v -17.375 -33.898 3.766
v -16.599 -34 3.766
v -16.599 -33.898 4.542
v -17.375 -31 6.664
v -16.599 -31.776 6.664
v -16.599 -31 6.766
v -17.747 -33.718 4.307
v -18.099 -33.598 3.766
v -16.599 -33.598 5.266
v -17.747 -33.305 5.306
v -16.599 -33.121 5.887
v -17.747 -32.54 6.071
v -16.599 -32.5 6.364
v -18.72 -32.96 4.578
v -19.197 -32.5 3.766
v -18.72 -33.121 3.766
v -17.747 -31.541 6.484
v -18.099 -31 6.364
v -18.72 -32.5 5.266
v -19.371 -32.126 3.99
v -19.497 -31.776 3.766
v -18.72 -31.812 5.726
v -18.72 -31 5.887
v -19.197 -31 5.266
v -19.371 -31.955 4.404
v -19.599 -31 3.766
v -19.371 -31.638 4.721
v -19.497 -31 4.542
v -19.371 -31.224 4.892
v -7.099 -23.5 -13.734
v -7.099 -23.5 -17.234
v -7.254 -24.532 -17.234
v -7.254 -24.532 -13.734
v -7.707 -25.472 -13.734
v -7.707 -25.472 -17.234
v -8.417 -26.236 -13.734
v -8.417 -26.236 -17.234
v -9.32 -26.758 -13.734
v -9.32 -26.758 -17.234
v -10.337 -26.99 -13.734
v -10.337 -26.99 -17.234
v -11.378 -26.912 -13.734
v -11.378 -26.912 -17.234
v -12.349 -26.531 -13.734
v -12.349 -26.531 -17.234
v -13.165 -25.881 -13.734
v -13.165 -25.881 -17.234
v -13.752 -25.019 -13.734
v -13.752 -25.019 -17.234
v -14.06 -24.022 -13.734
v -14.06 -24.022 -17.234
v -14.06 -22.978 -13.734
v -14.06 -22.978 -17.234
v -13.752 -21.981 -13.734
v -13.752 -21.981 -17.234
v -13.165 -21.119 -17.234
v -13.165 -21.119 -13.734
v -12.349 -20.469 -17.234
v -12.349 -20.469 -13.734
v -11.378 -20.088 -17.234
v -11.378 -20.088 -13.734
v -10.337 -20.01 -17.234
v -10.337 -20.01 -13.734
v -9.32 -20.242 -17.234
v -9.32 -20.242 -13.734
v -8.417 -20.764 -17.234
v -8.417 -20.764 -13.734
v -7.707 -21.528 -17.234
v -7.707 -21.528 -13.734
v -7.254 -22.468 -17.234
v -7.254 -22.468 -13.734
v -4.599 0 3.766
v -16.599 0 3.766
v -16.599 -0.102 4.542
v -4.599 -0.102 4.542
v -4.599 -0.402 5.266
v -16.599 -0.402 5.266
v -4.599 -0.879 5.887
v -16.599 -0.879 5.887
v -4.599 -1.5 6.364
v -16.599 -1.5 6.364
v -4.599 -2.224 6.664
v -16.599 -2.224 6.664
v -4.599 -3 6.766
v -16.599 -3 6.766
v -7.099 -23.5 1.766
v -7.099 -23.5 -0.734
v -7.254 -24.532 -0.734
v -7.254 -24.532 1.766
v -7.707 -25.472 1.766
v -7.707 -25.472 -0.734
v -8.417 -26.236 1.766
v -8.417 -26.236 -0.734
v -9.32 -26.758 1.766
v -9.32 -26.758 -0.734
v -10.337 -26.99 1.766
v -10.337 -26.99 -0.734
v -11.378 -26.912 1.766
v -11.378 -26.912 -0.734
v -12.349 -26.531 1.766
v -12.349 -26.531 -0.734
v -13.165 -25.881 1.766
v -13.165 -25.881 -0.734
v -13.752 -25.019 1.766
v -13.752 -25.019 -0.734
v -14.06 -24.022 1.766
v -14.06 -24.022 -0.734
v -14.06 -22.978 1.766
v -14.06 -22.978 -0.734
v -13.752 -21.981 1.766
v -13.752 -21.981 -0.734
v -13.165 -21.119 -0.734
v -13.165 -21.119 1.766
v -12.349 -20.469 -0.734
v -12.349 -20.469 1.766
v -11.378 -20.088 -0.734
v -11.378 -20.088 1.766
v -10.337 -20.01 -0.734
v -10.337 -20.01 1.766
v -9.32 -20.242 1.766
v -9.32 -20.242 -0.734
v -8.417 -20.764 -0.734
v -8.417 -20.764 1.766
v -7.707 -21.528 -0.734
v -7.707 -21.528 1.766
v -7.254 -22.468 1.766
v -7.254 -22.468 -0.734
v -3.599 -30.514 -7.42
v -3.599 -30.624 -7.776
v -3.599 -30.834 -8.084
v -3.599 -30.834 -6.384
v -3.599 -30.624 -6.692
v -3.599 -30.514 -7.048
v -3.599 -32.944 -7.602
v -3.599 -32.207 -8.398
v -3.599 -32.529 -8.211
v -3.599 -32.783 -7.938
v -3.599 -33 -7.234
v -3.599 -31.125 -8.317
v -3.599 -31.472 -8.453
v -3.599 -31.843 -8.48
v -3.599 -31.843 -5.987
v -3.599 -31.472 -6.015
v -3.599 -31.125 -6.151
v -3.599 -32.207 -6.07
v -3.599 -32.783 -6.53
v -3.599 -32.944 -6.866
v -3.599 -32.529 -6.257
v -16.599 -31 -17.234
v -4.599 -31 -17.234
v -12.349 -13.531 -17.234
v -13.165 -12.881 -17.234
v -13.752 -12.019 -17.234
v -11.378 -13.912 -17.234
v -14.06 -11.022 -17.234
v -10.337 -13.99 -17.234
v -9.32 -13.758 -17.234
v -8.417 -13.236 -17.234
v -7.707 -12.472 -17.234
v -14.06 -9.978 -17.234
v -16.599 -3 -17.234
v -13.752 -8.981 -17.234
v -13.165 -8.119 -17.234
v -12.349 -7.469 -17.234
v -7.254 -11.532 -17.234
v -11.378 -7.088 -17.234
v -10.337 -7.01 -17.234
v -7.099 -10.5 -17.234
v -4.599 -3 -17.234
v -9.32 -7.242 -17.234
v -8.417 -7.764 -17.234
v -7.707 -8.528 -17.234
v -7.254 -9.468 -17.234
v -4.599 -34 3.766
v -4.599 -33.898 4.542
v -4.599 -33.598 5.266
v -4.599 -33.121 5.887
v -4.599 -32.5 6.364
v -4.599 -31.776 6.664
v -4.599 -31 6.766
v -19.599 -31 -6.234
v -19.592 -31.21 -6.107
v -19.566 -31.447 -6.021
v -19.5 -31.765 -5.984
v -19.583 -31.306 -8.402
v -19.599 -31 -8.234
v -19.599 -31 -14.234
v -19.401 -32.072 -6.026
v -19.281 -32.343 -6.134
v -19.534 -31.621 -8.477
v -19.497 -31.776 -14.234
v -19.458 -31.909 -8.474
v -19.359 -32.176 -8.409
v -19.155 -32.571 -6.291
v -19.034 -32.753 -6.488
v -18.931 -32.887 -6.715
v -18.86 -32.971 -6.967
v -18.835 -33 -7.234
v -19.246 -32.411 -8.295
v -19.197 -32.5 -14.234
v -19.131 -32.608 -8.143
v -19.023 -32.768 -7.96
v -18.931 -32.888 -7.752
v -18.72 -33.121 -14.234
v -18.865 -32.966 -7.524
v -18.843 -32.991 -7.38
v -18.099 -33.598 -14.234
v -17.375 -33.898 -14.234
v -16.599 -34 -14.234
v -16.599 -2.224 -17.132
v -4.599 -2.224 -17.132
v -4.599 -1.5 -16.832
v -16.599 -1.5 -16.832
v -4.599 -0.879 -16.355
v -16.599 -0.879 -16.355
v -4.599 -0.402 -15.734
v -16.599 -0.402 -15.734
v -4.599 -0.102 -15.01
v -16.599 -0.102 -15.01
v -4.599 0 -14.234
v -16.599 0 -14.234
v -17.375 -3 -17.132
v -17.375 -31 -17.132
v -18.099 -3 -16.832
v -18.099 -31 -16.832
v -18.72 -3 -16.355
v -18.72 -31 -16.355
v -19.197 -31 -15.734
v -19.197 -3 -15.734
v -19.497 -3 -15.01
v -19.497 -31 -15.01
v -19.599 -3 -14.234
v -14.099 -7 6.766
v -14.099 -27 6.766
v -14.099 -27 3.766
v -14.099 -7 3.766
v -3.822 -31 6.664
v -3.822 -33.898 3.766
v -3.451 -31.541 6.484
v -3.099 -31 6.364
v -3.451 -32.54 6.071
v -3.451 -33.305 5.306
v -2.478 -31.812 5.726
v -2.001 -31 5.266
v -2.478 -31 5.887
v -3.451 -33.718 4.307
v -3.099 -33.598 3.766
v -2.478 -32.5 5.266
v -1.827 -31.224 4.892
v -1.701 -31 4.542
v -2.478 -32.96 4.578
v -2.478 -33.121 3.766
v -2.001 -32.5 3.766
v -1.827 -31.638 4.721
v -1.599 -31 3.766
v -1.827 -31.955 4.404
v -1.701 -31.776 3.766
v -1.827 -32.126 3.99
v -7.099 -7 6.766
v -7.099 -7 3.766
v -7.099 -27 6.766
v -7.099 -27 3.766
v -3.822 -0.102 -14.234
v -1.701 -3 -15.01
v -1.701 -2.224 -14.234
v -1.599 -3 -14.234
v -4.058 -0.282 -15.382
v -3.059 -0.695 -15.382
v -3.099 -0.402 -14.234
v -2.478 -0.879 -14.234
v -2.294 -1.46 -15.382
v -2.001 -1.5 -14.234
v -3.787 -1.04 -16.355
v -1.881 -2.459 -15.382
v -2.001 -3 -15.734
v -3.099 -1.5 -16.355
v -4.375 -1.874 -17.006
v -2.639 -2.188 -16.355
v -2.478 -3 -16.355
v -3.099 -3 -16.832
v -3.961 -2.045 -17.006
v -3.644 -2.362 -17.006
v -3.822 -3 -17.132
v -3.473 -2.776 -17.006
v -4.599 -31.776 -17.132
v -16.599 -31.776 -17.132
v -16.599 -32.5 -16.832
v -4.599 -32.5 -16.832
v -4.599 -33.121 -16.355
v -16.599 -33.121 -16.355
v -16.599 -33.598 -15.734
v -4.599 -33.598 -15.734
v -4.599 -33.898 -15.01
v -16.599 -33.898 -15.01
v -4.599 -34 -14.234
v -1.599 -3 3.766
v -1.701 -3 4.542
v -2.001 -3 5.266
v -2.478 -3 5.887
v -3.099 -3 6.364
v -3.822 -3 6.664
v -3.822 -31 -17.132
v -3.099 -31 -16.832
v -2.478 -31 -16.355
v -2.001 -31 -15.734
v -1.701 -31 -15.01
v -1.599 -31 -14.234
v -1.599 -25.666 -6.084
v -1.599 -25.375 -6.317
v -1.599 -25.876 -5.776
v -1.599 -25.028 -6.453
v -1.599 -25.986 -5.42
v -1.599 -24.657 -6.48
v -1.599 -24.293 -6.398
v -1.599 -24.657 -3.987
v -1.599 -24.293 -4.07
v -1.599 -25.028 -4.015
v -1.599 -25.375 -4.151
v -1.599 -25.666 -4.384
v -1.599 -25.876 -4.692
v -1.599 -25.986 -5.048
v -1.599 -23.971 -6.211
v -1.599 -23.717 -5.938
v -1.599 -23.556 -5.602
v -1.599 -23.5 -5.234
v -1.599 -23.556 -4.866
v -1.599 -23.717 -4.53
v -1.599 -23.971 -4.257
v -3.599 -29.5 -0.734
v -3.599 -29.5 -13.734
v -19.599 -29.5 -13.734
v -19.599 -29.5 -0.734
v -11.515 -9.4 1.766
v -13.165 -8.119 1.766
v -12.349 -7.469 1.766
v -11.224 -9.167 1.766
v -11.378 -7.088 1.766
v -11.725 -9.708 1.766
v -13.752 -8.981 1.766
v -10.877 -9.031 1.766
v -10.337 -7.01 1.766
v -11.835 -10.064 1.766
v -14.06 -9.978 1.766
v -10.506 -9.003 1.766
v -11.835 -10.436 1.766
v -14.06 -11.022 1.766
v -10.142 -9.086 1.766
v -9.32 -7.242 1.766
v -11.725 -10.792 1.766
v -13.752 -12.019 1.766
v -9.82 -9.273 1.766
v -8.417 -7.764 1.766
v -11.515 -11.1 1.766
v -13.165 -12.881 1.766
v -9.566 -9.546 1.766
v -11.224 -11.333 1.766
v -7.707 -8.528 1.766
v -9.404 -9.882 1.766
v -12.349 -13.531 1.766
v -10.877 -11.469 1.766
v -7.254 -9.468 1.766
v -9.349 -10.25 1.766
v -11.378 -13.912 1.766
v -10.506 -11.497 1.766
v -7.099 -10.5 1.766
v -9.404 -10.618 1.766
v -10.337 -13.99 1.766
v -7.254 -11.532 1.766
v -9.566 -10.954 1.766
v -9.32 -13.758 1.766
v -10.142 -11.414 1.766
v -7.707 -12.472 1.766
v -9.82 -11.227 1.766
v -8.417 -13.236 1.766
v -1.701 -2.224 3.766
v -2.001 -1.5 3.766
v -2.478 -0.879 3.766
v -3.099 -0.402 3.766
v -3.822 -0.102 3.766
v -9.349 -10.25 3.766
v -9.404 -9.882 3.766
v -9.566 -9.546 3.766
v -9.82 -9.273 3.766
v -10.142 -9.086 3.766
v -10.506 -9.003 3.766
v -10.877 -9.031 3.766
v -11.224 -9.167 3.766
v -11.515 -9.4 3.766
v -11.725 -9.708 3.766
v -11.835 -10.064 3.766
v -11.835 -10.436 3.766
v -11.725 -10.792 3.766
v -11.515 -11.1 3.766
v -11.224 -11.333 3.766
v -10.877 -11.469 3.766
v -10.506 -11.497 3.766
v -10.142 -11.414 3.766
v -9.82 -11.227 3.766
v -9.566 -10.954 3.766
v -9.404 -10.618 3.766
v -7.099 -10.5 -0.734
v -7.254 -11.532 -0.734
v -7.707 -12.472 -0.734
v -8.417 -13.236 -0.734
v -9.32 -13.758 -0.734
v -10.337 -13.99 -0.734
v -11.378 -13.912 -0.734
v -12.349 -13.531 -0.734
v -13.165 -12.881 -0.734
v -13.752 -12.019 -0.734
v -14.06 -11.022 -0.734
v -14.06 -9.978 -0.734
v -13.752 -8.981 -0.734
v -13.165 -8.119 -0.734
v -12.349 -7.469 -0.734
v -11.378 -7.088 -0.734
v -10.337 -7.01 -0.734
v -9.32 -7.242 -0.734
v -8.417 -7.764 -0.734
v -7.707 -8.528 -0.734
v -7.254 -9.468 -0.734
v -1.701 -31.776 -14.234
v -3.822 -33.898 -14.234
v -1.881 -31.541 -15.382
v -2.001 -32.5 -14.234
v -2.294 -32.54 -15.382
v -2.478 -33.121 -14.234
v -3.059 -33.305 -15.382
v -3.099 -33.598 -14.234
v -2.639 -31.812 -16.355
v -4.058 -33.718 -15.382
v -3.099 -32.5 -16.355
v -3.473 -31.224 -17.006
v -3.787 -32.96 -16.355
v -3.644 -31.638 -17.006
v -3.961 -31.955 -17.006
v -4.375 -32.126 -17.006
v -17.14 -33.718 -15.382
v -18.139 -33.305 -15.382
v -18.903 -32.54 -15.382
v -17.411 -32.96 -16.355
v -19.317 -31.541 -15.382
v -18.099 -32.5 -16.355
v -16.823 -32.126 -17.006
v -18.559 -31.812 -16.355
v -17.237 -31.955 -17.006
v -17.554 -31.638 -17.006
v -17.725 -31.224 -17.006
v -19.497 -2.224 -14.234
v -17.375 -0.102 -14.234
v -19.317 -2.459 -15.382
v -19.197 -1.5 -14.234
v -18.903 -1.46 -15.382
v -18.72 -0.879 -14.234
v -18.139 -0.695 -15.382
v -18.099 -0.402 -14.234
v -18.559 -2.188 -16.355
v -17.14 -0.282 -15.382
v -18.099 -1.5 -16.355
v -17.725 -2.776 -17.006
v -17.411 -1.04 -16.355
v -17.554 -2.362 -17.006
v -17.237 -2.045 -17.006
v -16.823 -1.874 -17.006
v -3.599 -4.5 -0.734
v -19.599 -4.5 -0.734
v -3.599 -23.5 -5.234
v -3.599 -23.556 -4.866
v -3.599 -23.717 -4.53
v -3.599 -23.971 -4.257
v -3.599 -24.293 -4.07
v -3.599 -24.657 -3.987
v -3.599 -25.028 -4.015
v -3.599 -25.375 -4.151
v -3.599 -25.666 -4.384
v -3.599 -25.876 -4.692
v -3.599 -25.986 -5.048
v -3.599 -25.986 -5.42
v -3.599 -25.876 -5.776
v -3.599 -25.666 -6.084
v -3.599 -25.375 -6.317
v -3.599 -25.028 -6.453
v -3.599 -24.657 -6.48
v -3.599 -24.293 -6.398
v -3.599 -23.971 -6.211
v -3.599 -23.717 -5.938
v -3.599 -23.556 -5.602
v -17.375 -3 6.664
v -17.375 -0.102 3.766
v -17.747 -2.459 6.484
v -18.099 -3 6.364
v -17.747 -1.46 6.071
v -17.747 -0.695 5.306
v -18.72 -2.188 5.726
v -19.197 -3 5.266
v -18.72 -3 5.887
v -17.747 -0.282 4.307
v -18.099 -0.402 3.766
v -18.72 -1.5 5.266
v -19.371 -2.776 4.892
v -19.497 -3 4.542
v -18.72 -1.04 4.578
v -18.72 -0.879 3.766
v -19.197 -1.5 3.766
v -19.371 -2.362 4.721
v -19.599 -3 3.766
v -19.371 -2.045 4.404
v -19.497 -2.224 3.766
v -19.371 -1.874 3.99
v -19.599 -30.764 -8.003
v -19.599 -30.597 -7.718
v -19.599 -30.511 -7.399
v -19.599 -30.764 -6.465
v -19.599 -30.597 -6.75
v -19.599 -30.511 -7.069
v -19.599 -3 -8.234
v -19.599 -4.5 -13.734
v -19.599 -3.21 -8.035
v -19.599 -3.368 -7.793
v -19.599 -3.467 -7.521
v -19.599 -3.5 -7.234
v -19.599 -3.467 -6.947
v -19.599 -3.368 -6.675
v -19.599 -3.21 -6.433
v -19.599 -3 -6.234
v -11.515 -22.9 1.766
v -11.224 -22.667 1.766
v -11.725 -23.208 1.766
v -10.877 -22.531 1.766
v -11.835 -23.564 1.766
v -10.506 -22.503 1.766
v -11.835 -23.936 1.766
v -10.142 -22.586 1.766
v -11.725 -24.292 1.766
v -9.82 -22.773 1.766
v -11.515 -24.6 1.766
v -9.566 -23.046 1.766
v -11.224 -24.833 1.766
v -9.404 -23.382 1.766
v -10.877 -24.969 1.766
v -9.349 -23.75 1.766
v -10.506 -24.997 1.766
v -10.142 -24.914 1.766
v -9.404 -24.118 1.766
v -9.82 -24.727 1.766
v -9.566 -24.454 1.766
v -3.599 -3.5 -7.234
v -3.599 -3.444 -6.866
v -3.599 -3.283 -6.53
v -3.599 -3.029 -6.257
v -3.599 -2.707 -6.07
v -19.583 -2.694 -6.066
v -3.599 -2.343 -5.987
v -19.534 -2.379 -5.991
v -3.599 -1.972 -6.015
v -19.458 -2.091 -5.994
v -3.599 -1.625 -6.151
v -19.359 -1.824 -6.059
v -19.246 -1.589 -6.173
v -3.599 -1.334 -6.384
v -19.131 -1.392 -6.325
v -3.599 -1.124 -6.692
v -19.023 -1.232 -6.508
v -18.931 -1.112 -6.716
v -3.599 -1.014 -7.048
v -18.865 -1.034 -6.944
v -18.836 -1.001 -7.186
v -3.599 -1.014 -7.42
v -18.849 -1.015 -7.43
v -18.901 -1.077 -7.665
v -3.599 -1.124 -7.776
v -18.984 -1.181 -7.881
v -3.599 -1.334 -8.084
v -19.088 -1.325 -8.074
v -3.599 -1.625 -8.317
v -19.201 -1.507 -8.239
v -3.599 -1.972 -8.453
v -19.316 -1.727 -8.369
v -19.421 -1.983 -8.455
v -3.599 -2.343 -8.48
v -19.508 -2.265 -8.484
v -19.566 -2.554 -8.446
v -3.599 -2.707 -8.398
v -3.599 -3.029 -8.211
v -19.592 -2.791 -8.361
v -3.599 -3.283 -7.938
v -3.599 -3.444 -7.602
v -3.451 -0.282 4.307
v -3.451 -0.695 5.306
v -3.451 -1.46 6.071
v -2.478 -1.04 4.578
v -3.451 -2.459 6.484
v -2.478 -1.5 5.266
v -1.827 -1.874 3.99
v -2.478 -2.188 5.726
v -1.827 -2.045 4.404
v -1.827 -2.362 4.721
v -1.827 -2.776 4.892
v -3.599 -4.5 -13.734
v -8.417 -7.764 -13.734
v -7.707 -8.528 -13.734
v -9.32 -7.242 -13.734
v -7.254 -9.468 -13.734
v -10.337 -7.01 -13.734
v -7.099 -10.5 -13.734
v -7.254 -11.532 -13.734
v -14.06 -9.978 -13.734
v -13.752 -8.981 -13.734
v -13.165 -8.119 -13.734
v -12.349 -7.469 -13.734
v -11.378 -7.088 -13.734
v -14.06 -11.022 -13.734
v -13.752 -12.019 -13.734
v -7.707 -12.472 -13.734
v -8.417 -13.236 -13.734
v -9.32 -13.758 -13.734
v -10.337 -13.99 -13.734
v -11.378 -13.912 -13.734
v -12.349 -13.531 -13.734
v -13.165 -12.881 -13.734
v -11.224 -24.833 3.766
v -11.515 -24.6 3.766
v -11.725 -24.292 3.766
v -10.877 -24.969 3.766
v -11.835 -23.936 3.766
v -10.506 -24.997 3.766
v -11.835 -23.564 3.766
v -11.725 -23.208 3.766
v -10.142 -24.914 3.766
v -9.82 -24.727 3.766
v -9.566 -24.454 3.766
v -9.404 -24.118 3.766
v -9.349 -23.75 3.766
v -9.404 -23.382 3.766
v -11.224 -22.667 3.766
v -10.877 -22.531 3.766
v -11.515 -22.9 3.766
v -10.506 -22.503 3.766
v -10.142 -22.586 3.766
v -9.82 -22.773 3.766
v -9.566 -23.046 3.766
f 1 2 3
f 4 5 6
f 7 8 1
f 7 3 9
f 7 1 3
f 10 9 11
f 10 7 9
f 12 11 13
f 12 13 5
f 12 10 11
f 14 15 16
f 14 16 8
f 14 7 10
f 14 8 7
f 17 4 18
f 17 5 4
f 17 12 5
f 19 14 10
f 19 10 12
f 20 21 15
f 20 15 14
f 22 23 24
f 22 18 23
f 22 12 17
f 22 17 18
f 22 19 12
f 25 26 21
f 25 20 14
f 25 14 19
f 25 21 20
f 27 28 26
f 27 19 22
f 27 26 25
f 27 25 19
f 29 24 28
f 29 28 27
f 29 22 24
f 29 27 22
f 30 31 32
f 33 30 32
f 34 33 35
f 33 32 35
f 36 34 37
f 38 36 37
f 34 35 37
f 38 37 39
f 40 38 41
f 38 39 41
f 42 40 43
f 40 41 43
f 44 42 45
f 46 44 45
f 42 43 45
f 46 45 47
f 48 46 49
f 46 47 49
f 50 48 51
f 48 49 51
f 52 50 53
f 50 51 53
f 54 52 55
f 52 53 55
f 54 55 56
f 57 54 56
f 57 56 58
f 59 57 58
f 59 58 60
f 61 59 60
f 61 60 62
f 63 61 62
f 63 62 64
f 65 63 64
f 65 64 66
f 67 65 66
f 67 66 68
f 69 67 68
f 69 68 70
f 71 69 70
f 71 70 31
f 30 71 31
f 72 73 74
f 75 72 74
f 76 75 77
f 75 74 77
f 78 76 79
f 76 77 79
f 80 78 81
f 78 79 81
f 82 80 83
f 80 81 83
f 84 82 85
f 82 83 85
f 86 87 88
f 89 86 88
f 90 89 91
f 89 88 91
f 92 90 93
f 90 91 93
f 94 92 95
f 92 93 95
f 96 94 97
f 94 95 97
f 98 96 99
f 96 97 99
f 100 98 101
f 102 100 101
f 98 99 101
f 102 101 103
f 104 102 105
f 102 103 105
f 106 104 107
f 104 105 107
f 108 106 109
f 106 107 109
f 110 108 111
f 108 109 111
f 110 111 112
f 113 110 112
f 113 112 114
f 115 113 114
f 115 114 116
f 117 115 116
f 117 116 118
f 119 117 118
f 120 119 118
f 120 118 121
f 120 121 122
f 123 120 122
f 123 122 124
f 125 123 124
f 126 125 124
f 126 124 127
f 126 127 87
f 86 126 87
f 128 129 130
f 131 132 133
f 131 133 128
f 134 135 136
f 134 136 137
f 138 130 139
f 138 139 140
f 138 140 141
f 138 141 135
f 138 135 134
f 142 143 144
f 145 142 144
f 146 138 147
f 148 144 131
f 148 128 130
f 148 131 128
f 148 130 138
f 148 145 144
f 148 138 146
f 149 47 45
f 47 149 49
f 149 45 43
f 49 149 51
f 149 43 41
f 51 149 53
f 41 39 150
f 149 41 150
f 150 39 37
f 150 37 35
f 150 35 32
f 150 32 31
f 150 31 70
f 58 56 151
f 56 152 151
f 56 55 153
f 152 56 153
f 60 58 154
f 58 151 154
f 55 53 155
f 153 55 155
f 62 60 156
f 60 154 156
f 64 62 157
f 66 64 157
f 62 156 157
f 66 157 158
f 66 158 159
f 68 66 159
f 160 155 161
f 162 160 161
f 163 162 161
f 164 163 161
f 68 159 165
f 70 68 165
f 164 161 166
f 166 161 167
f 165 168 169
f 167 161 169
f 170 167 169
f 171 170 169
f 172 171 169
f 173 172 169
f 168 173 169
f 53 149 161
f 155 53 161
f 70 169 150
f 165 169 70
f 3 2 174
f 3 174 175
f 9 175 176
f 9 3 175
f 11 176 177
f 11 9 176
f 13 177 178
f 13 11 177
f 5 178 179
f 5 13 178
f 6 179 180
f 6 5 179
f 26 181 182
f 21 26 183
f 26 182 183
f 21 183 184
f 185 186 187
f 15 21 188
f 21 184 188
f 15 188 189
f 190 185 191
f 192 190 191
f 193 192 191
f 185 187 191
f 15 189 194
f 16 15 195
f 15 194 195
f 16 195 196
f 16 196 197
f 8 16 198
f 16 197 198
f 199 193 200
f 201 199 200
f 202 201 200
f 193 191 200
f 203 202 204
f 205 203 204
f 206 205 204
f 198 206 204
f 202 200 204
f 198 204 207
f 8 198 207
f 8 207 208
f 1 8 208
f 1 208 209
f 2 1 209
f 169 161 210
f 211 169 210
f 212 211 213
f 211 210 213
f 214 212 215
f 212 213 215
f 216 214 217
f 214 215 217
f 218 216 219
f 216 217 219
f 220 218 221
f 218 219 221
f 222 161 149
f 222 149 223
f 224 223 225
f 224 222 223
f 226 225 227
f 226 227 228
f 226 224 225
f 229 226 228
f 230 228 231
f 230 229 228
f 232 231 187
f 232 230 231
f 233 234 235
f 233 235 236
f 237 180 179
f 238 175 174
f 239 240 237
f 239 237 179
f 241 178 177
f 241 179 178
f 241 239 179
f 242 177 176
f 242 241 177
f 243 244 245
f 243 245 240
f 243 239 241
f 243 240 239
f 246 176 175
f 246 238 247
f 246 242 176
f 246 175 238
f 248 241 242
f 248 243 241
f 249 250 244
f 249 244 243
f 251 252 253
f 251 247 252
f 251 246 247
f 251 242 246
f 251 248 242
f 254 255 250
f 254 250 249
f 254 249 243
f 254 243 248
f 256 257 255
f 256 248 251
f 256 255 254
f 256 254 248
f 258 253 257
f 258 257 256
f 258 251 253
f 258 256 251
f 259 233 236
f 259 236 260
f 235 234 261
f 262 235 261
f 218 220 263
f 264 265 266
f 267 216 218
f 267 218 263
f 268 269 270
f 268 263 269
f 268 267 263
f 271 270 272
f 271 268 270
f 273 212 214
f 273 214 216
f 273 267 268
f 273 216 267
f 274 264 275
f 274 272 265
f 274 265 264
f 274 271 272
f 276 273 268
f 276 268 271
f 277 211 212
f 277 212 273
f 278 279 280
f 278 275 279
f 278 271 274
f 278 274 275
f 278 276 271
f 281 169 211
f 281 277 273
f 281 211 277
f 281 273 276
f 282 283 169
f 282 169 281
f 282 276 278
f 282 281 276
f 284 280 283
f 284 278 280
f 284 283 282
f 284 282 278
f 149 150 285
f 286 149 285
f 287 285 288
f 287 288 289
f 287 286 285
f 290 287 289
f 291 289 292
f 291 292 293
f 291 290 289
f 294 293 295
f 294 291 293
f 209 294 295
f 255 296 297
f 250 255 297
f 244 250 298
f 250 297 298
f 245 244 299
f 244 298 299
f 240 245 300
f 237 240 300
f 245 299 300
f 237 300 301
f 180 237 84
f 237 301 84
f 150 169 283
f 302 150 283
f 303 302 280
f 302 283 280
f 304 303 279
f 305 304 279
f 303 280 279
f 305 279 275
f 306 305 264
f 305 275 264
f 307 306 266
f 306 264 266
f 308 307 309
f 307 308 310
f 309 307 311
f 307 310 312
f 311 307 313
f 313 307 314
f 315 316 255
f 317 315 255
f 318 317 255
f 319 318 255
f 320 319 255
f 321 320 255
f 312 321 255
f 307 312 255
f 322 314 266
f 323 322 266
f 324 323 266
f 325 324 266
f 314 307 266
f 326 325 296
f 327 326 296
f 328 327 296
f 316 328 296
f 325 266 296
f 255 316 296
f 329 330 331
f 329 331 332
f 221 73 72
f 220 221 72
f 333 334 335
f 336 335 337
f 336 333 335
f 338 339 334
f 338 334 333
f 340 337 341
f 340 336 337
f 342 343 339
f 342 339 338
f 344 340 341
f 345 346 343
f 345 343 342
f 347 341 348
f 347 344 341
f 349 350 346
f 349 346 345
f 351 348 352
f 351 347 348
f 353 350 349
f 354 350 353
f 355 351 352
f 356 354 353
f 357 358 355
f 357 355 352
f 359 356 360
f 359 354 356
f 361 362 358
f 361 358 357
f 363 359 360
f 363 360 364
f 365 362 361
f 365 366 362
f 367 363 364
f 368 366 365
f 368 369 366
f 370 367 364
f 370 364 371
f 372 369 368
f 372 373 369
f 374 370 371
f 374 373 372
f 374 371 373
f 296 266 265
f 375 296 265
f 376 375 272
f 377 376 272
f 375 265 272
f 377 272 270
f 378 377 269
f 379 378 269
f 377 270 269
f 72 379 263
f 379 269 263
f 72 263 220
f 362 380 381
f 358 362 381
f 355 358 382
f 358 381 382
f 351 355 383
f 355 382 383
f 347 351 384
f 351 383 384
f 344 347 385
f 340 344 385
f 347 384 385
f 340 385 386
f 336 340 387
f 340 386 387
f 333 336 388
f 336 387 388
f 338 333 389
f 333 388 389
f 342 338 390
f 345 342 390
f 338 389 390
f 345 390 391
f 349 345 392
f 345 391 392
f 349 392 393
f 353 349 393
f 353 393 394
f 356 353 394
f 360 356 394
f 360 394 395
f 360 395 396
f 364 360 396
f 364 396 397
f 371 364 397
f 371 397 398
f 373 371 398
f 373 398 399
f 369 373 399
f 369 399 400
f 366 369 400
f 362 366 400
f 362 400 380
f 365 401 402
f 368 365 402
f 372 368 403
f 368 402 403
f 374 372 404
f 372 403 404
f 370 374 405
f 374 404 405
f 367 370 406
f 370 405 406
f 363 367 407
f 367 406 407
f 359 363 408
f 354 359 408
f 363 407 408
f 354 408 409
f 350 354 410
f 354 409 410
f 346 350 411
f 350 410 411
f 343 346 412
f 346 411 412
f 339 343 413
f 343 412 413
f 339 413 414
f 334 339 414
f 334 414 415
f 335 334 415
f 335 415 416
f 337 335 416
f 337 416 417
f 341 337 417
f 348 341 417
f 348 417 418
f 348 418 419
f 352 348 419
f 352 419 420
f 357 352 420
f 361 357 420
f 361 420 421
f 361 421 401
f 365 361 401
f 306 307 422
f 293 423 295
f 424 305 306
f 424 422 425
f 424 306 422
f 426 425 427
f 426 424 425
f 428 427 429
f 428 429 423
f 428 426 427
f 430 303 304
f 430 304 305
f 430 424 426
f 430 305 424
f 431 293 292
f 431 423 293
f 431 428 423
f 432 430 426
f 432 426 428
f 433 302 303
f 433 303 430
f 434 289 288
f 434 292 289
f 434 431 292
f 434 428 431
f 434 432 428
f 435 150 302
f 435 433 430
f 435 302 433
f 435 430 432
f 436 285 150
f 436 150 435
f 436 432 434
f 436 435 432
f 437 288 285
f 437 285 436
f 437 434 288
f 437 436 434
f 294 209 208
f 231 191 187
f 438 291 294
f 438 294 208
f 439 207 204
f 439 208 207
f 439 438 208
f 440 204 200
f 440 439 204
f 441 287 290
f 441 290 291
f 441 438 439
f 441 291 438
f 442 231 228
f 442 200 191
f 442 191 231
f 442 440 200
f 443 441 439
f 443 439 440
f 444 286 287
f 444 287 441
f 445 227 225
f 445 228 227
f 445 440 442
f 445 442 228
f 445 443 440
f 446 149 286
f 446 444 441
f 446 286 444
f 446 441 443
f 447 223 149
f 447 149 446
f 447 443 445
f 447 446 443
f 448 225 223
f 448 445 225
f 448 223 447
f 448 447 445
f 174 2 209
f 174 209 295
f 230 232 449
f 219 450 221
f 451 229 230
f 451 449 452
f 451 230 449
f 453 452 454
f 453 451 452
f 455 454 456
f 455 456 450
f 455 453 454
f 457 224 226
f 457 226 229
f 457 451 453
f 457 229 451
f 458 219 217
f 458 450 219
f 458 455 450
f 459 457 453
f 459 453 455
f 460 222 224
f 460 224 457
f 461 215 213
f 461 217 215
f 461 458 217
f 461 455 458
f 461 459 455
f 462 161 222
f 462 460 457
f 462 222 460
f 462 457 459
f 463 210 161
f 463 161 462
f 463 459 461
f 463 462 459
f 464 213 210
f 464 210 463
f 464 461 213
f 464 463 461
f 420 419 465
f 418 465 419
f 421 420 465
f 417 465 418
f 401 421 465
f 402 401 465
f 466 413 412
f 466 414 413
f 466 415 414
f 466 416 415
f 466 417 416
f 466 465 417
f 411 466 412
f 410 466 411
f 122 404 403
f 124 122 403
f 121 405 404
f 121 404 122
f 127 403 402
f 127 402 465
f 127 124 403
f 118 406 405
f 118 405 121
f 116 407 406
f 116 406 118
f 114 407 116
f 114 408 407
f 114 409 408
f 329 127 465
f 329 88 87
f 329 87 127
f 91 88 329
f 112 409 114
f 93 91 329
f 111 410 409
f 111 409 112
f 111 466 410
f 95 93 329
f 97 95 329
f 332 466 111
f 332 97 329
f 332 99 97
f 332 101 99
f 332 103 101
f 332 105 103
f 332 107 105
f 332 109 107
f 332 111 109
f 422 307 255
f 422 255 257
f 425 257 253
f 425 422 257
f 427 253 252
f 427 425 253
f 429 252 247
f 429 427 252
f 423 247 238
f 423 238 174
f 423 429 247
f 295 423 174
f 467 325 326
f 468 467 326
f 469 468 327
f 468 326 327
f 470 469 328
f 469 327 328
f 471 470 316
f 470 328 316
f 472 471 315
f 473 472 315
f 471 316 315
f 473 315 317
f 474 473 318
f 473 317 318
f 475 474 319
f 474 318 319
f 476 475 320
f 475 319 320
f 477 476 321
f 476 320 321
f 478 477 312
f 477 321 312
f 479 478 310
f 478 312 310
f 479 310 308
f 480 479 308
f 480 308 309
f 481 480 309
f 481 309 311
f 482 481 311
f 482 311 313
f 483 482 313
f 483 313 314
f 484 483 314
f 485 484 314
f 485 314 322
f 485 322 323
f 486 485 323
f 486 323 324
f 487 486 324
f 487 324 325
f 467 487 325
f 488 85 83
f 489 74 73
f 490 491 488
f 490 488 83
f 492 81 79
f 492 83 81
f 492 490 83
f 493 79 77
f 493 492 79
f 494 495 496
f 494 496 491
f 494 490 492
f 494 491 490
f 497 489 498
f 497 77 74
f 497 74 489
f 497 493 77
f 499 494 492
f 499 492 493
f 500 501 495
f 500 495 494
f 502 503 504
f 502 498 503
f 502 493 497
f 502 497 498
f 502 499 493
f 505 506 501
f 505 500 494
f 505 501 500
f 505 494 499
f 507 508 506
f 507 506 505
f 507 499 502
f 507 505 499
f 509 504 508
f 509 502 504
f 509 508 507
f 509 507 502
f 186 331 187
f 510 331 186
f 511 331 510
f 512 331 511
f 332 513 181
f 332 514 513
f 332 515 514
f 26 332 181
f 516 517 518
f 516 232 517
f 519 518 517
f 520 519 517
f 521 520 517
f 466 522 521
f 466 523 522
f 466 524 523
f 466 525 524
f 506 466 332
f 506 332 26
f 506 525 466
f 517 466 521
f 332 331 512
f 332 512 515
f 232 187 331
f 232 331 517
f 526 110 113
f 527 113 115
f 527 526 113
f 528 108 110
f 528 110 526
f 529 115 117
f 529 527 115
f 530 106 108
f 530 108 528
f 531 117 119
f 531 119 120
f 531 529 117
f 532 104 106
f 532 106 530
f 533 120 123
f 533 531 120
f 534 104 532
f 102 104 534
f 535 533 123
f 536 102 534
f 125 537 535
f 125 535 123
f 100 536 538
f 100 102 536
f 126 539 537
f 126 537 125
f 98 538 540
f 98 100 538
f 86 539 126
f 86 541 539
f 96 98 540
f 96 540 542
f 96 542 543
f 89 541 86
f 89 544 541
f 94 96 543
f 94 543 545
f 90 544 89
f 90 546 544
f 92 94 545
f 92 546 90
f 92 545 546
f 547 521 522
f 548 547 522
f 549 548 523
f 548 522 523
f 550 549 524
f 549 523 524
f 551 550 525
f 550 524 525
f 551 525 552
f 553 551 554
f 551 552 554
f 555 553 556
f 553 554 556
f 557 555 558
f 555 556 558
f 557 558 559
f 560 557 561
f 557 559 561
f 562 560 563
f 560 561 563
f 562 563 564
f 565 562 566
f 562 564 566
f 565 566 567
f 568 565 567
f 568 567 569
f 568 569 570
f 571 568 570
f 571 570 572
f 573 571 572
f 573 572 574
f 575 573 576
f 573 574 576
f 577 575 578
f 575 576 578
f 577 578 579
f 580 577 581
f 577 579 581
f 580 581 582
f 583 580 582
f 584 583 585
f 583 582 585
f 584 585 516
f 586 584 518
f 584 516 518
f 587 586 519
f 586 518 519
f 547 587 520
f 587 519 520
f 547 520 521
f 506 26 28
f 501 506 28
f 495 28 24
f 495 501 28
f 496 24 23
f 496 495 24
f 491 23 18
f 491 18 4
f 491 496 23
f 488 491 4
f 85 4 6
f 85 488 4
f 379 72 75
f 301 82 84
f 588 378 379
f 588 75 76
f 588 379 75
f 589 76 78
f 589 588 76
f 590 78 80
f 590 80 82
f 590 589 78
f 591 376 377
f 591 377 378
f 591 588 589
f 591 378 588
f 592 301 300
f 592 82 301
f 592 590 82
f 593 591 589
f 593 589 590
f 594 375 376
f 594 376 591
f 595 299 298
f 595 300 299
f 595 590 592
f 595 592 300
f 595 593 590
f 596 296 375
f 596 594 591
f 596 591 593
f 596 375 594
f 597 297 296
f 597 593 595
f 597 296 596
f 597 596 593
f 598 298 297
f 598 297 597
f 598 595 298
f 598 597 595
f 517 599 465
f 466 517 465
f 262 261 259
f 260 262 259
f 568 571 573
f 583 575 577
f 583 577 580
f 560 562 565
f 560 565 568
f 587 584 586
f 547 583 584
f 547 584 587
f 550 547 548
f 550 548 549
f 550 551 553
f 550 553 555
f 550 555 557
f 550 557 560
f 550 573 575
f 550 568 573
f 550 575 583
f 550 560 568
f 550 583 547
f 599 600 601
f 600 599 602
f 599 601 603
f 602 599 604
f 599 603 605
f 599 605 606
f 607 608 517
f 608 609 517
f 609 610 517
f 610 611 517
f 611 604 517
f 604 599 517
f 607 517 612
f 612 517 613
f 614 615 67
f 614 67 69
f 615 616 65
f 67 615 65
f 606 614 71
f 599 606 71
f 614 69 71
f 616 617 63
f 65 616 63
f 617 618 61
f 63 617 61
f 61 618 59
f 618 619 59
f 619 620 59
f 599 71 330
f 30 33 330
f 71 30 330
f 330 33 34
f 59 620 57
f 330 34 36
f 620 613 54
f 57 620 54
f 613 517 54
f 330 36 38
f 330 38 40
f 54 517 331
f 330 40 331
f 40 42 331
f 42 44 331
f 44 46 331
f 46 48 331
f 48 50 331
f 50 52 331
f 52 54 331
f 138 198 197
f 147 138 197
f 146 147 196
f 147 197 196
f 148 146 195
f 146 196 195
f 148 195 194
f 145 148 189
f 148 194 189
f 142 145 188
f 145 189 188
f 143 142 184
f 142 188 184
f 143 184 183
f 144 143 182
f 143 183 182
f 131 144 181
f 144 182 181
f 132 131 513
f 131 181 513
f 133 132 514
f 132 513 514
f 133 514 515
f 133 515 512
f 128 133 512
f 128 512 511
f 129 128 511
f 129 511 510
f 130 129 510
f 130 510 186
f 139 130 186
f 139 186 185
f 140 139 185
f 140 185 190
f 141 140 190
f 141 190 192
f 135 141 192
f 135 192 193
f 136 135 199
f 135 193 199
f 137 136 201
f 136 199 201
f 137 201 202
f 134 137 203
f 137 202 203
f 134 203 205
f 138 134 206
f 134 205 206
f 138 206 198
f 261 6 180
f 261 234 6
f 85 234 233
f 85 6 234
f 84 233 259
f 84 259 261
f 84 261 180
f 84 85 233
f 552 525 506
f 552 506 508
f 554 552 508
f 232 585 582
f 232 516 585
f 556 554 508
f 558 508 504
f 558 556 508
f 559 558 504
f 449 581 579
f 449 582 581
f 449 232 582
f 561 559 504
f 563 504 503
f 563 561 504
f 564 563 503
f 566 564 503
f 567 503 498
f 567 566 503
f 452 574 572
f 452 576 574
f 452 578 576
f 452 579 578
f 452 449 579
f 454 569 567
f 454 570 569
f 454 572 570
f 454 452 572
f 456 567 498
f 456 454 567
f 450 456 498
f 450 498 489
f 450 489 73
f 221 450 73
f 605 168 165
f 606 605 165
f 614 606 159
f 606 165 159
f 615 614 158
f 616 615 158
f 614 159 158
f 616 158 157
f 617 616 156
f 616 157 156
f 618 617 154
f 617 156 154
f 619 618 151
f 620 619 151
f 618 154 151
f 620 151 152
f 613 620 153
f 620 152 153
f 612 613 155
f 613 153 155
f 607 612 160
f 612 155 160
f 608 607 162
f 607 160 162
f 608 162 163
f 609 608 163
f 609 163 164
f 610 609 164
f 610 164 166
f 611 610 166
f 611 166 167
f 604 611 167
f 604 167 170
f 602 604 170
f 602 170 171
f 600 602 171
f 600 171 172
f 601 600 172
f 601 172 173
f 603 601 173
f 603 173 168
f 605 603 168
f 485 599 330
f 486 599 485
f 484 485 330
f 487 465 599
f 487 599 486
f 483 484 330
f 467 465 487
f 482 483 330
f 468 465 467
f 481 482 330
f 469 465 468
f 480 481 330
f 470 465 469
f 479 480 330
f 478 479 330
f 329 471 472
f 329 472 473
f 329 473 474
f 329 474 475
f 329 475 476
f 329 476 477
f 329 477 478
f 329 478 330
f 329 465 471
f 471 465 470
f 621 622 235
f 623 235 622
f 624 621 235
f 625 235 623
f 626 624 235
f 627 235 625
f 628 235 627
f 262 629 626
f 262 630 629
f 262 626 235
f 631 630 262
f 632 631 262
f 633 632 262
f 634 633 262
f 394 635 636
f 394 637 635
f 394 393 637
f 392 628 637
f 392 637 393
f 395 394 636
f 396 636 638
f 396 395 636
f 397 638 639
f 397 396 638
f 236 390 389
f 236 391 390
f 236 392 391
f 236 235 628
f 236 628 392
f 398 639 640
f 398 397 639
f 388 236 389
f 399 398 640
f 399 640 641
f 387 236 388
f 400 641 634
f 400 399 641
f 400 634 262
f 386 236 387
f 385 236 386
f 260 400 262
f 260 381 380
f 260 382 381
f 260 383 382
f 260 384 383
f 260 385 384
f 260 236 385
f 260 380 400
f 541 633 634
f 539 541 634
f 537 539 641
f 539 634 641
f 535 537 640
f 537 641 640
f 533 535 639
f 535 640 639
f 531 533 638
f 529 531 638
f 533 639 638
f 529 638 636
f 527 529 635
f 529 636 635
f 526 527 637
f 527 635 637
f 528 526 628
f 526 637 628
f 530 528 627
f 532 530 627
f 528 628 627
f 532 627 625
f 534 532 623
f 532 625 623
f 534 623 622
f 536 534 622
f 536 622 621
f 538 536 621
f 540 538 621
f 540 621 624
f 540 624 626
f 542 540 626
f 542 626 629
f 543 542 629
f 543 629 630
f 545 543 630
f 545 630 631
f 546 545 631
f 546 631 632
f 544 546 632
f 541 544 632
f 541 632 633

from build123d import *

# Parameters (mm, degrees)
F0_W         = 18
F0_H         = 24
F1_DEPTH     = 34
F2_W         = 25
F2_H         = 13
F2_R         = 1.25
F3_DEPTH     = 16
F4_W         = 7
F4_H         = 20
F5_DEPTH     = 3
F6_R         = 1.25
F7_DEPTH     = 4
F8_T1_DEPTH  = 28
F8_T3_DEPTH  = 18
F8_T5_DEPTH  = 12
F8_S9_W      = 3
F8_S9_H      = 3
F8_T10_DEPTH = 3
F8_S15_W     = 3
F8_S15_H     = 3
F8_T16_DEPTH = 3
F8_S21_W     = 3
F8_S21_H     = 3
F8_T22_DEPTH = 3
F8_S27_W     = 3
F8_S27_H     = 3
F8_T28_DEPTH = 3
F8_S33_W     = 3
F8_S33_H     = 3
F8_T34_DEPTH = 3
F8_S39_W     = 3
F8_S39_H     = 3
F8_T40_DEPTH = 3
F8_S45_W     = 3
F8_S45_H     = 3
F8_T46_DEPTH = 3
F8_S51_W     = 3
F8_S51_H     = 3
F8_T52_DEPTH = 3
F9_R         = 3.5
F10_DEPTH    = 19
F11_R        = 1.25
F12_DEPTH    = 18.0010001


# Not quite as in the source:
# - a fillet or chamfer that OpenCascade refuses, or shapes differently, is made with other operations: its cross-section is extruded or revolved along the edge and cut away or added


with BuildPart() as f1:
    # F0 (on Front) → F1 (new body)
    with BuildSketch(Plane.XZ):
        with Locations((-10.5989521787, -5.2339873202)):
            Rectangle(F0_W, F0_H)
    extrude(amount=F1_DEPTH)

    # F2 (on face) → F3 (cut)
    with BuildSketch(Plane(origin=(-19.5989521787, 0, 0), x_dir=(0, -1, 0), z_dir=(-1, 0, 0))):
        with Locations((17, -7.2339873202)):
            Rectangle(F2_W, F2_H)
        with Locations((2.25, -7.2339873202)):
            Circle(F2_R)
        with Locations((31.75, -7.2339873202)):
            Circle(F2_R)
    extrude(amount=-F3_DEPTH, mode=Mode.SUBTRACT)

    # F4 (on face) → F5 (cut)
    with BuildSketch(Plane.XY.offset(6.7660126798)):
        with Locations((-10.5989521787, -17)):
            Rectangle(F4_W, F4_H)
    extrude(amount=-F5_DEPTH, mode=Mode.SUBTRACT)

    # F6 (on face) → F7 (cut)
    with BuildSketch(Plane.XY.offset(3.7660126798)):
        with Locations((-10.5989521787, -10.25)):
            Circle(F6_R)
        with Locations((-10.5989521787, -23.75)):
            Circle(F6_R)
    extrude(amount=-F7_DEPTH, mode=Mode.SUBTRACT)

    # F8: fillet of radius 3 on 12 edges, made by hand

    # F8_s2 → F8_t1 (cut)
    with BuildSketch(Plane.XZ.offset(3)):
        with BuildLine():
            ThreePointArc((-19.5989521787, 3.7660126798), (-18.7202725222, 5.8873330233), (-16.5989521787, 6.7660126798))
            Line((-16.5989521787, 6.7660126798), (-19.5989521787, 6.7660126798))
            Line((-19.5989521787, 6.7660126798), (-19.5989521787, 3.7660126798))
        make_face()
        with BuildLine():
            ThreePointArc((-16.5989521787, -17.2339873202), (-18.7202725222, -16.3553076638), (-19.5989521787, -14.2339873202))
            Line((-19.5989521787, -14.2339873202), (-19.5989521787, -17.2339873202))
            Line((-19.5989521787, -17.2339873202), (-16.5989521787, -17.2339873202))
        make_face()
        with BuildLine():
            ThreePointArc((-4.5989521787, -17.2339873202), (-2.4776318351, -16.3553076638), (-1.5989521787, -14.2339873202))
            Line((-1.5989521787, -14.2339873202), (-1.5989521787, -17.2339873202))
            Line((-1.5989521787, -17.2339873202), (-4.5989521787, -17.2339873202))
        make_face()
        with BuildLine():
            ThreePointArc((-1.5989521787, 3.7660126798), (-2.4776318351, 5.8873330233), (-4.5989521787, 6.7660126798))
            Line((-4.5989521787, 6.7660126798), (-1.5989521787, 6.7660126798))
            Line((-1.5989521787, 6.7660126798), (-1.5989521787, 3.7660126798))
        make_face()
    extrude(amount=F8_T1_DEPTH, mode=Mode.SUBTRACT)

    # F8_s4 → F8_t3 (cut)
    with BuildSketch(Plane.XY.offset(-14.2339873202)):
        with BuildLine():
            ThreePointArc((-19.5989521787, -31), (-18.7202725222, -33.1213203436), (-16.5989521787, -34))
            Line((-16.5989521787, -34), (-19.5989521787, -34))
            Line((-19.5989521787, -34), (-19.5989521787, -31))
        make_face()
        with BuildLine():
            ThreePointArc((-1.5989521787, -31), (-2.4776318351, -33.1213203436), (-4.5989521787, -34))
            Line((-4.5989521787, -34), (-1.5989521787, -34))
            Line((-1.5989521787, -34), (-1.5989521787, -31))
        make_face()
        with BuildLine():
            ThreePointArc((-19.5989521787, -3), (-18.7202725222, -0.8786796564), (-16.5989521787, 0))
            Line((-16.5989521787, 0), (-19.5989521787, 0))
            Line((-19.5989521787, 0), (-19.5989521787, -3))
        make_face()
        with BuildLine():
            ThreePointArc((-1.5989521787, -3), (-2.4776318351, -0.8786796564), (-4.5989521787, 0))
            Line((-4.5989521787, 0), (-1.5989521787, 0))
            Line((-1.5989521787, 0), (-1.5989521787, -3))
        make_face()
    extrude(amount=F8_T3_DEPTH, mode=Mode.SUBTRACT)

    # F8_s6 → F8_t5 (cut)
    with BuildSketch(Plane.YZ.offset(-16.5989521787)):
        with BuildLine():
            ThreePointArc((-31, -17.2339873202), (-33.1213203436, -16.3553076638), (-34, -14.2339873202))
            Line((-34, -14.2339873202), (-34, -17.2339873202))
            Line((-34, -17.2339873202), (-31, -17.2339873202))
        make_face()
        with BuildLine():
            ThreePointArc((0, 3.7660126798), (-0.8786796564, 5.8873330233), (-3, 6.7660126798))
            Line((-3, 6.7660126798), (0, 6.7660126798))
            Line((0, 6.7660126798), (0, 3.7660126798))
        make_face()
        with BuildLine():
            ThreePointArc((-34, 3.7660126798), (-33.1213203436, 5.8873330233), (-31, 6.7660126798))
            Line((-31, 6.7660126798), (-34, 6.7660126798))
            Line((-34, 6.7660126798), (-34, 3.7660126798))
        make_face()
        with BuildLine():
            ThreePointArc((-3, -17.2339873202), (-0.8786796564, -16.3553076638), (0, -14.2339873202))
            Line((0, -14.2339873202), (0, -17.2339873202))
            Line((0, -17.2339873202), (-3, -17.2339873202))
        make_face()
    extrude(amount=F8_T5_DEPTH, mode=Mode.SUBTRACT)


with BuildPart() as f8_tool8:
    # F8_s9 → F8_t10 (new body)
    with BuildSketch(Plane.YZ.offset(-16.5989521787)):
        with Locations((-1.5, 5.2660126798)):
            Rectangle(F8_S9_W, F8_S9_H)
    extrude(amount=-F8_T10_DEPTH)

    # F8_s11 → F8_t12 (revolve, cut)
    with BuildSketch(Plane(origin=(-16.5989521787, -3, 3.7660126798), x_dir=(0, -0.7071067812, -0.7071067812), z_dir=(0, 0.7071067812, -0.7071067812))):
        with BuildLine():
            ThreePointArc((0, -3), (3, 0), (0, 3))
            Line((0, 3), (0, -3))
        make_face()
    revolve(axis=Axis((-16.5989521787, -3, 3.7660126798), (-1, 0, 0)), mode=Mode.SUBTRACT)


with BuildPart() as f1_1:
    add(f1.part)

    # F8_t7: cut F8_tool8
    add(f8_tool8.part, mode=Mode.SUBTRACT)


with BuildPart() as f8_tool14:
    # F8_s15 → F8_t16 (new body)
    with BuildSketch(Plane.YZ.offset(-16.5989521787)):
        with Locations((-32.5, 5.2660126798)):
            Rectangle(F8_S15_W, F8_S15_H)
    extrude(amount=-F8_T16_DEPTH)

    # F8_s17 → F8_t18 (revolve, cut)
    with BuildSketch(Plane(origin=(-16.5989521787, -31, 3.7660126798), x_dir=(0, 0.7071067812, -0.7071067812), z_dir=(0, 0.7071067812, 0.7071067812))):
        with BuildLine():
            ThreePointArc((0, -3), (3, 0), (0, 3))
            Line((0, 3), (0, -3))
        make_face()
    revolve(axis=Axis((-16.5989521787, -31, 3.7660126798), (-1, 0, 0)), mode=Mode.SUBTRACT)


with BuildPart() as f1_2:
    add(f1_1.part)

    # F8_t13: cut F8_tool14
    add(f8_tool14.part, mode=Mode.SUBTRACT)


with BuildPart() as f8_tool20:
    # F8_s21 → F8_t22 (new body)
    with BuildSketch(Plane.XY.offset(-14.2339873202)):
        with Locations((-18.0989521787, -32.5)):
            Rectangle(F8_S21_W, F8_S21_H)
    extrude(amount=-F8_T22_DEPTH)

    # F8_s23 → F8_t24 (revolve, cut)
    with BuildSketch(Plane(origin=(-16.5989521787, -31, -14.2339873202), x_dir=(0.7071067812, 0.7071067812, 0), z_dir=(-0.7071067812, 0.7071067812, 0))):
        with BuildLine():
            ThreePointArc((0, -3), (3, 0), (0, 3))
            Line((0, 3), (0, -3))
        make_face()
    revolve(axis=Axis((-16.5989521787, -31, -14.2339873202), (0, 0, -1)), mode=Mode.SUBTRACT)


with BuildPart() as f1_3:
    add(f1_2.part)

    # F8_t19: cut F8_tool20
    add(f8_tool20.part, mode=Mode.SUBTRACT)


with BuildPart() as f8_tool26:
    # F8_s27 → F8_t28 (new body)
    with BuildSketch(Plane.XY.offset(-14.2339873202)):
        with Locations((-3.0989521787, -32.5)):
            Rectangle(F8_S27_W, F8_S27_H)
    extrude(amount=-F8_T28_DEPTH)

    # F8_s29 → F8_t30 (revolve, cut)
    with BuildSketch(Plane(origin=(-4.5989521787, -31, -14.2339873202), x_dir=(-0.7071067812, 0.7071067812, 0), z_dir=(-0.7071067812, -0.7071067812, 0))):
        with BuildLine():
            ThreePointArc((0, -3), (3, 0), (0, 3))
            Line((0, 3), (0, -3))
        make_face()
    revolve(axis=Axis((-4.5989521787, -31, -14.2339873202), (0, 0, -1)), mode=Mode.SUBTRACT)


with BuildPart() as f1_4:
    add(f1_3.part)

    # F8_t25: cut F8_tool26
    add(f8_tool26.part, mode=Mode.SUBTRACT)


with BuildPart() as f8_tool32:
    # F8_s33 → F8_t34 (new body)
    with BuildSketch(Plane.YZ.offset(-4.5989521787)):
        with Locations((-32.5, 5.2660126798)):
            Rectangle(F8_S33_W, F8_S33_H)
    extrude(amount=F8_T34_DEPTH)

    # F8_s35 → F8_t36 (revolve, cut)
    with BuildSketch(Plane(origin=(-4.5989521787, -31, 3.7660126798), x_dir=(0, 0.7071067812, -0.7071067812), z_dir=(0, -0.7071067812, -0.7071067812))):
        with BuildLine():
            ThreePointArc((0, -3), (3, 0), (0, 3))
            Line((0, 3), (0, -3))
        make_face()
    revolve(axis=Axis((-4.5989521787, -31, 3.7660126798), (1, 0, 0)), mode=Mode.SUBTRACT)


with BuildPart() as f1_5:
    add(f1_4.part)

    # F8_t31: cut F8_tool32
    add(f8_tool32.part, mode=Mode.SUBTRACT)


with BuildPart() as f8_tool38:
    # F8_s39 → F8_t40 (new body)
    with BuildSketch(Plane.XY.offset(-14.2339873202)):
        with Locations((-18.0989521787, -1.5)):
            Rectangle(F8_S39_W, F8_S39_H)
    extrude(amount=-F8_T40_DEPTH)

    # F8_s41 → F8_t42 (revolve, cut)
    with BuildSketch(Plane(origin=(-16.5989521787, -3, -14.2339873202), x_dir=(0.7071067812, -0.7071067812, 0), z_dir=(0.7071067812, 0.7071067812, 0))):
        with BuildLine():
            ThreePointArc((0, -3), (3, 0), (0, 3))
            Line((0, 3), (0, -3))
        make_face()
    revolve(axis=Axis((-16.5989521787, -3, -14.2339873202), (0, 0, -1)), mode=Mode.SUBTRACT)


with BuildPart() as f1_6:
    add(f1_5.part)

    # F8_t37: cut F8_tool38
    add(f8_tool38.part, mode=Mode.SUBTRACT)


with BuildPart() as f8_tool44:
    # F8_s45 → F8_t46 (new body)
    with BuildSketch(Plane.XY.offset(-14.2339873202)):
        with Locations((-3.0989521787, -1.5)):
            Rectangle(F8_S45_W, F8_S45_H)
    extrude(amount=-F8_T46_DEPTH)

    # F8_s47 → F8_t48 (revolve, cut)
    with BuildSketch(Plane(origin=(-4.5989521787, -3, -14.2339873202), x_dir=(-0.7071067812, -0.7071067812, 0), z_dir=(0.7071067812, -0.7071067812, 0))):
        with BuildLine():
            ThreePointArc((0, -3), (3, 0), (0, 3))
            Line((0, 3), (0, -3))
        make_face()
    revolve(axis=Axis((-4.5989521787, -3, -14.2339873202), (0, 0, -1)), mode=Mode.SUBTRACT)


with BuildPart() as f1_7:
    add(f1_6.part)

    # F8_t43: cut F8_tool44
    add(f8_tool44.part, mode=Mode.SUBTRACT)


with BuildPart() as f8_tool50:
    # F8_s51 → F8_t52 (new body)
    with BuildSketch(Plane.YZ.offset(-4.5989521787)):
        with Locations((-1.5, 5.2660126798)):
            Rectangle(F8_S51_W, F8_S51_H)
    extrude(amount=F8_T52_DEPTH)

    # F8_s53 → F8_t54 (revolve, cut)
    with BuildSketch(Plane(origin=(-4.5989521787, -3, 3.7660126798), x_dir=(0, -0.7071067812, -0.7071067812), z_dir=(0, -0.7071067812, 0.7071067812))):
        with BuildLine():
            ThreePointArc((0, -3), (3, 0), (0, 3))
            Line((0, 3), (0, -3))
        make_face()
    revolve(axis=Axis((-4.5989521787, -3, 3.7660126798), (1, 0, 0)), mode=Mode.SUBTRACT)


with BuildPart() as f1_8:
    add(f1_7.part)

    # F8_t49: cut F8_tool50
    add(f8_tool50.part, mode=Mode.SUBTRACT)

    # F9 (on face) → F10 (cut)
    with BuildSketch(Plane(origin=(0, 0, -17.2339873202), x_dir=(1, 0, 0), z_dir=(0, 0, -1))):
        with Locations((-10.5989521787, 10.5)):
            Circle(F9_R)
        with Locations((-10.5989521787, 23.5)):
            Circle(F9_R)
    extrude(amount=-F10_DEPTH, mode=Mode.SUBTRACT)

    # F11 (on face) → F12 (cut, through all)
    with BuildSketch(Plane.YZ.offset(-1.5989521787)):
        with Locations((-24.75, -5.2339873202)):
            Circle(F11_R)
    extrude(amount=-F12_DEPTH, mode=Mode.SUBTRACT)


solid = f1_8.part
